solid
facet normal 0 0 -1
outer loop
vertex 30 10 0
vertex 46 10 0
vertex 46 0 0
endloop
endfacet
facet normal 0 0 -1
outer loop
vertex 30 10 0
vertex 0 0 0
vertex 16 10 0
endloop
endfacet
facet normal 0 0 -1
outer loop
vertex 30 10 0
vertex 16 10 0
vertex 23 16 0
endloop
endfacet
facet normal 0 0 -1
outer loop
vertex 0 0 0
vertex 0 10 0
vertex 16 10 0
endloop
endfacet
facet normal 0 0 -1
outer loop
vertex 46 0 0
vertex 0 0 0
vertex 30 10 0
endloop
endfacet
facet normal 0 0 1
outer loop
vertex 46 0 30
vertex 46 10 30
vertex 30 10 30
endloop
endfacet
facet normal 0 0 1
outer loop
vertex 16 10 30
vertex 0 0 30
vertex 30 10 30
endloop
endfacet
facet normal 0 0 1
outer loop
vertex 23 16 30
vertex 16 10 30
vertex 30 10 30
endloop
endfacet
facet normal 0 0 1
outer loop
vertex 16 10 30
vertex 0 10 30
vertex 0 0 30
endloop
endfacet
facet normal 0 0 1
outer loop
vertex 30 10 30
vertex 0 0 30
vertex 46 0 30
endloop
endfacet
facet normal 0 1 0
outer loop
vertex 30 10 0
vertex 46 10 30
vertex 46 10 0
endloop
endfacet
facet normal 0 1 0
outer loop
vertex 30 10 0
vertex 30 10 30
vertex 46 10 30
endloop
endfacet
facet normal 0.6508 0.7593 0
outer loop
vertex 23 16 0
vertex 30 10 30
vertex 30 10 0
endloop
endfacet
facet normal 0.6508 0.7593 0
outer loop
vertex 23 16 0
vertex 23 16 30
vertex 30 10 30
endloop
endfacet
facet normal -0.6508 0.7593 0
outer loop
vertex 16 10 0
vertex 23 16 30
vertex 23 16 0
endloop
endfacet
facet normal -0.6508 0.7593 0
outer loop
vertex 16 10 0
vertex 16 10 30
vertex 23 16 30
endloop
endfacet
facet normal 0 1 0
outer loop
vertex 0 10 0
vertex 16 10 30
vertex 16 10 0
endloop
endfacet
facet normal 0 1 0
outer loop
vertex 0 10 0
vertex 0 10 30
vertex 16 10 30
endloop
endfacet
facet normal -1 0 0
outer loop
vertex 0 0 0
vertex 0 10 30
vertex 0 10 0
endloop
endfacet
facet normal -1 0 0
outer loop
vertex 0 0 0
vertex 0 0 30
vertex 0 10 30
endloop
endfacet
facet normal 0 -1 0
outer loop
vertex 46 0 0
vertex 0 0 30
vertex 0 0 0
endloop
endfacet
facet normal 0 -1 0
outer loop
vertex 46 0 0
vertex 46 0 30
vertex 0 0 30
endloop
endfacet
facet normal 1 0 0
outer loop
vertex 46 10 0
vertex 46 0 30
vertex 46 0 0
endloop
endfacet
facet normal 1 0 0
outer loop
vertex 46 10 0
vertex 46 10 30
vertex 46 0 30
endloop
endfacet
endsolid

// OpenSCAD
$fn = 32;

// ----------------------------------------------------------------------
// V guide rail: vrib, 46 mm wide
// ----------------------------------------------------------------------

// --- parameters (mm) ---
rail_w = 46;              // rail width, X
base_t = 10;              // base plate thickness
v_depth = 6;              // V feature depth / height
v_half_w = 7;             // half width of the V at the base face
plate_t = 30;             // rail length, Z (the extrusion height)
fit_tol = 0.02;           // declared fit tolerance (prompt contract)
free_tol = 0.2;           // declared free tolerance (prompt contract)

profile = [[0, 0], [46, 0], [46, 10], [30, 10], [23, 16], [16, 10], [0, 10]];  // primary outline, 7 points, counter clockwise

// --- the one profile operation ---
linear_extrude(height = plate_t) polygon(points = profile);
